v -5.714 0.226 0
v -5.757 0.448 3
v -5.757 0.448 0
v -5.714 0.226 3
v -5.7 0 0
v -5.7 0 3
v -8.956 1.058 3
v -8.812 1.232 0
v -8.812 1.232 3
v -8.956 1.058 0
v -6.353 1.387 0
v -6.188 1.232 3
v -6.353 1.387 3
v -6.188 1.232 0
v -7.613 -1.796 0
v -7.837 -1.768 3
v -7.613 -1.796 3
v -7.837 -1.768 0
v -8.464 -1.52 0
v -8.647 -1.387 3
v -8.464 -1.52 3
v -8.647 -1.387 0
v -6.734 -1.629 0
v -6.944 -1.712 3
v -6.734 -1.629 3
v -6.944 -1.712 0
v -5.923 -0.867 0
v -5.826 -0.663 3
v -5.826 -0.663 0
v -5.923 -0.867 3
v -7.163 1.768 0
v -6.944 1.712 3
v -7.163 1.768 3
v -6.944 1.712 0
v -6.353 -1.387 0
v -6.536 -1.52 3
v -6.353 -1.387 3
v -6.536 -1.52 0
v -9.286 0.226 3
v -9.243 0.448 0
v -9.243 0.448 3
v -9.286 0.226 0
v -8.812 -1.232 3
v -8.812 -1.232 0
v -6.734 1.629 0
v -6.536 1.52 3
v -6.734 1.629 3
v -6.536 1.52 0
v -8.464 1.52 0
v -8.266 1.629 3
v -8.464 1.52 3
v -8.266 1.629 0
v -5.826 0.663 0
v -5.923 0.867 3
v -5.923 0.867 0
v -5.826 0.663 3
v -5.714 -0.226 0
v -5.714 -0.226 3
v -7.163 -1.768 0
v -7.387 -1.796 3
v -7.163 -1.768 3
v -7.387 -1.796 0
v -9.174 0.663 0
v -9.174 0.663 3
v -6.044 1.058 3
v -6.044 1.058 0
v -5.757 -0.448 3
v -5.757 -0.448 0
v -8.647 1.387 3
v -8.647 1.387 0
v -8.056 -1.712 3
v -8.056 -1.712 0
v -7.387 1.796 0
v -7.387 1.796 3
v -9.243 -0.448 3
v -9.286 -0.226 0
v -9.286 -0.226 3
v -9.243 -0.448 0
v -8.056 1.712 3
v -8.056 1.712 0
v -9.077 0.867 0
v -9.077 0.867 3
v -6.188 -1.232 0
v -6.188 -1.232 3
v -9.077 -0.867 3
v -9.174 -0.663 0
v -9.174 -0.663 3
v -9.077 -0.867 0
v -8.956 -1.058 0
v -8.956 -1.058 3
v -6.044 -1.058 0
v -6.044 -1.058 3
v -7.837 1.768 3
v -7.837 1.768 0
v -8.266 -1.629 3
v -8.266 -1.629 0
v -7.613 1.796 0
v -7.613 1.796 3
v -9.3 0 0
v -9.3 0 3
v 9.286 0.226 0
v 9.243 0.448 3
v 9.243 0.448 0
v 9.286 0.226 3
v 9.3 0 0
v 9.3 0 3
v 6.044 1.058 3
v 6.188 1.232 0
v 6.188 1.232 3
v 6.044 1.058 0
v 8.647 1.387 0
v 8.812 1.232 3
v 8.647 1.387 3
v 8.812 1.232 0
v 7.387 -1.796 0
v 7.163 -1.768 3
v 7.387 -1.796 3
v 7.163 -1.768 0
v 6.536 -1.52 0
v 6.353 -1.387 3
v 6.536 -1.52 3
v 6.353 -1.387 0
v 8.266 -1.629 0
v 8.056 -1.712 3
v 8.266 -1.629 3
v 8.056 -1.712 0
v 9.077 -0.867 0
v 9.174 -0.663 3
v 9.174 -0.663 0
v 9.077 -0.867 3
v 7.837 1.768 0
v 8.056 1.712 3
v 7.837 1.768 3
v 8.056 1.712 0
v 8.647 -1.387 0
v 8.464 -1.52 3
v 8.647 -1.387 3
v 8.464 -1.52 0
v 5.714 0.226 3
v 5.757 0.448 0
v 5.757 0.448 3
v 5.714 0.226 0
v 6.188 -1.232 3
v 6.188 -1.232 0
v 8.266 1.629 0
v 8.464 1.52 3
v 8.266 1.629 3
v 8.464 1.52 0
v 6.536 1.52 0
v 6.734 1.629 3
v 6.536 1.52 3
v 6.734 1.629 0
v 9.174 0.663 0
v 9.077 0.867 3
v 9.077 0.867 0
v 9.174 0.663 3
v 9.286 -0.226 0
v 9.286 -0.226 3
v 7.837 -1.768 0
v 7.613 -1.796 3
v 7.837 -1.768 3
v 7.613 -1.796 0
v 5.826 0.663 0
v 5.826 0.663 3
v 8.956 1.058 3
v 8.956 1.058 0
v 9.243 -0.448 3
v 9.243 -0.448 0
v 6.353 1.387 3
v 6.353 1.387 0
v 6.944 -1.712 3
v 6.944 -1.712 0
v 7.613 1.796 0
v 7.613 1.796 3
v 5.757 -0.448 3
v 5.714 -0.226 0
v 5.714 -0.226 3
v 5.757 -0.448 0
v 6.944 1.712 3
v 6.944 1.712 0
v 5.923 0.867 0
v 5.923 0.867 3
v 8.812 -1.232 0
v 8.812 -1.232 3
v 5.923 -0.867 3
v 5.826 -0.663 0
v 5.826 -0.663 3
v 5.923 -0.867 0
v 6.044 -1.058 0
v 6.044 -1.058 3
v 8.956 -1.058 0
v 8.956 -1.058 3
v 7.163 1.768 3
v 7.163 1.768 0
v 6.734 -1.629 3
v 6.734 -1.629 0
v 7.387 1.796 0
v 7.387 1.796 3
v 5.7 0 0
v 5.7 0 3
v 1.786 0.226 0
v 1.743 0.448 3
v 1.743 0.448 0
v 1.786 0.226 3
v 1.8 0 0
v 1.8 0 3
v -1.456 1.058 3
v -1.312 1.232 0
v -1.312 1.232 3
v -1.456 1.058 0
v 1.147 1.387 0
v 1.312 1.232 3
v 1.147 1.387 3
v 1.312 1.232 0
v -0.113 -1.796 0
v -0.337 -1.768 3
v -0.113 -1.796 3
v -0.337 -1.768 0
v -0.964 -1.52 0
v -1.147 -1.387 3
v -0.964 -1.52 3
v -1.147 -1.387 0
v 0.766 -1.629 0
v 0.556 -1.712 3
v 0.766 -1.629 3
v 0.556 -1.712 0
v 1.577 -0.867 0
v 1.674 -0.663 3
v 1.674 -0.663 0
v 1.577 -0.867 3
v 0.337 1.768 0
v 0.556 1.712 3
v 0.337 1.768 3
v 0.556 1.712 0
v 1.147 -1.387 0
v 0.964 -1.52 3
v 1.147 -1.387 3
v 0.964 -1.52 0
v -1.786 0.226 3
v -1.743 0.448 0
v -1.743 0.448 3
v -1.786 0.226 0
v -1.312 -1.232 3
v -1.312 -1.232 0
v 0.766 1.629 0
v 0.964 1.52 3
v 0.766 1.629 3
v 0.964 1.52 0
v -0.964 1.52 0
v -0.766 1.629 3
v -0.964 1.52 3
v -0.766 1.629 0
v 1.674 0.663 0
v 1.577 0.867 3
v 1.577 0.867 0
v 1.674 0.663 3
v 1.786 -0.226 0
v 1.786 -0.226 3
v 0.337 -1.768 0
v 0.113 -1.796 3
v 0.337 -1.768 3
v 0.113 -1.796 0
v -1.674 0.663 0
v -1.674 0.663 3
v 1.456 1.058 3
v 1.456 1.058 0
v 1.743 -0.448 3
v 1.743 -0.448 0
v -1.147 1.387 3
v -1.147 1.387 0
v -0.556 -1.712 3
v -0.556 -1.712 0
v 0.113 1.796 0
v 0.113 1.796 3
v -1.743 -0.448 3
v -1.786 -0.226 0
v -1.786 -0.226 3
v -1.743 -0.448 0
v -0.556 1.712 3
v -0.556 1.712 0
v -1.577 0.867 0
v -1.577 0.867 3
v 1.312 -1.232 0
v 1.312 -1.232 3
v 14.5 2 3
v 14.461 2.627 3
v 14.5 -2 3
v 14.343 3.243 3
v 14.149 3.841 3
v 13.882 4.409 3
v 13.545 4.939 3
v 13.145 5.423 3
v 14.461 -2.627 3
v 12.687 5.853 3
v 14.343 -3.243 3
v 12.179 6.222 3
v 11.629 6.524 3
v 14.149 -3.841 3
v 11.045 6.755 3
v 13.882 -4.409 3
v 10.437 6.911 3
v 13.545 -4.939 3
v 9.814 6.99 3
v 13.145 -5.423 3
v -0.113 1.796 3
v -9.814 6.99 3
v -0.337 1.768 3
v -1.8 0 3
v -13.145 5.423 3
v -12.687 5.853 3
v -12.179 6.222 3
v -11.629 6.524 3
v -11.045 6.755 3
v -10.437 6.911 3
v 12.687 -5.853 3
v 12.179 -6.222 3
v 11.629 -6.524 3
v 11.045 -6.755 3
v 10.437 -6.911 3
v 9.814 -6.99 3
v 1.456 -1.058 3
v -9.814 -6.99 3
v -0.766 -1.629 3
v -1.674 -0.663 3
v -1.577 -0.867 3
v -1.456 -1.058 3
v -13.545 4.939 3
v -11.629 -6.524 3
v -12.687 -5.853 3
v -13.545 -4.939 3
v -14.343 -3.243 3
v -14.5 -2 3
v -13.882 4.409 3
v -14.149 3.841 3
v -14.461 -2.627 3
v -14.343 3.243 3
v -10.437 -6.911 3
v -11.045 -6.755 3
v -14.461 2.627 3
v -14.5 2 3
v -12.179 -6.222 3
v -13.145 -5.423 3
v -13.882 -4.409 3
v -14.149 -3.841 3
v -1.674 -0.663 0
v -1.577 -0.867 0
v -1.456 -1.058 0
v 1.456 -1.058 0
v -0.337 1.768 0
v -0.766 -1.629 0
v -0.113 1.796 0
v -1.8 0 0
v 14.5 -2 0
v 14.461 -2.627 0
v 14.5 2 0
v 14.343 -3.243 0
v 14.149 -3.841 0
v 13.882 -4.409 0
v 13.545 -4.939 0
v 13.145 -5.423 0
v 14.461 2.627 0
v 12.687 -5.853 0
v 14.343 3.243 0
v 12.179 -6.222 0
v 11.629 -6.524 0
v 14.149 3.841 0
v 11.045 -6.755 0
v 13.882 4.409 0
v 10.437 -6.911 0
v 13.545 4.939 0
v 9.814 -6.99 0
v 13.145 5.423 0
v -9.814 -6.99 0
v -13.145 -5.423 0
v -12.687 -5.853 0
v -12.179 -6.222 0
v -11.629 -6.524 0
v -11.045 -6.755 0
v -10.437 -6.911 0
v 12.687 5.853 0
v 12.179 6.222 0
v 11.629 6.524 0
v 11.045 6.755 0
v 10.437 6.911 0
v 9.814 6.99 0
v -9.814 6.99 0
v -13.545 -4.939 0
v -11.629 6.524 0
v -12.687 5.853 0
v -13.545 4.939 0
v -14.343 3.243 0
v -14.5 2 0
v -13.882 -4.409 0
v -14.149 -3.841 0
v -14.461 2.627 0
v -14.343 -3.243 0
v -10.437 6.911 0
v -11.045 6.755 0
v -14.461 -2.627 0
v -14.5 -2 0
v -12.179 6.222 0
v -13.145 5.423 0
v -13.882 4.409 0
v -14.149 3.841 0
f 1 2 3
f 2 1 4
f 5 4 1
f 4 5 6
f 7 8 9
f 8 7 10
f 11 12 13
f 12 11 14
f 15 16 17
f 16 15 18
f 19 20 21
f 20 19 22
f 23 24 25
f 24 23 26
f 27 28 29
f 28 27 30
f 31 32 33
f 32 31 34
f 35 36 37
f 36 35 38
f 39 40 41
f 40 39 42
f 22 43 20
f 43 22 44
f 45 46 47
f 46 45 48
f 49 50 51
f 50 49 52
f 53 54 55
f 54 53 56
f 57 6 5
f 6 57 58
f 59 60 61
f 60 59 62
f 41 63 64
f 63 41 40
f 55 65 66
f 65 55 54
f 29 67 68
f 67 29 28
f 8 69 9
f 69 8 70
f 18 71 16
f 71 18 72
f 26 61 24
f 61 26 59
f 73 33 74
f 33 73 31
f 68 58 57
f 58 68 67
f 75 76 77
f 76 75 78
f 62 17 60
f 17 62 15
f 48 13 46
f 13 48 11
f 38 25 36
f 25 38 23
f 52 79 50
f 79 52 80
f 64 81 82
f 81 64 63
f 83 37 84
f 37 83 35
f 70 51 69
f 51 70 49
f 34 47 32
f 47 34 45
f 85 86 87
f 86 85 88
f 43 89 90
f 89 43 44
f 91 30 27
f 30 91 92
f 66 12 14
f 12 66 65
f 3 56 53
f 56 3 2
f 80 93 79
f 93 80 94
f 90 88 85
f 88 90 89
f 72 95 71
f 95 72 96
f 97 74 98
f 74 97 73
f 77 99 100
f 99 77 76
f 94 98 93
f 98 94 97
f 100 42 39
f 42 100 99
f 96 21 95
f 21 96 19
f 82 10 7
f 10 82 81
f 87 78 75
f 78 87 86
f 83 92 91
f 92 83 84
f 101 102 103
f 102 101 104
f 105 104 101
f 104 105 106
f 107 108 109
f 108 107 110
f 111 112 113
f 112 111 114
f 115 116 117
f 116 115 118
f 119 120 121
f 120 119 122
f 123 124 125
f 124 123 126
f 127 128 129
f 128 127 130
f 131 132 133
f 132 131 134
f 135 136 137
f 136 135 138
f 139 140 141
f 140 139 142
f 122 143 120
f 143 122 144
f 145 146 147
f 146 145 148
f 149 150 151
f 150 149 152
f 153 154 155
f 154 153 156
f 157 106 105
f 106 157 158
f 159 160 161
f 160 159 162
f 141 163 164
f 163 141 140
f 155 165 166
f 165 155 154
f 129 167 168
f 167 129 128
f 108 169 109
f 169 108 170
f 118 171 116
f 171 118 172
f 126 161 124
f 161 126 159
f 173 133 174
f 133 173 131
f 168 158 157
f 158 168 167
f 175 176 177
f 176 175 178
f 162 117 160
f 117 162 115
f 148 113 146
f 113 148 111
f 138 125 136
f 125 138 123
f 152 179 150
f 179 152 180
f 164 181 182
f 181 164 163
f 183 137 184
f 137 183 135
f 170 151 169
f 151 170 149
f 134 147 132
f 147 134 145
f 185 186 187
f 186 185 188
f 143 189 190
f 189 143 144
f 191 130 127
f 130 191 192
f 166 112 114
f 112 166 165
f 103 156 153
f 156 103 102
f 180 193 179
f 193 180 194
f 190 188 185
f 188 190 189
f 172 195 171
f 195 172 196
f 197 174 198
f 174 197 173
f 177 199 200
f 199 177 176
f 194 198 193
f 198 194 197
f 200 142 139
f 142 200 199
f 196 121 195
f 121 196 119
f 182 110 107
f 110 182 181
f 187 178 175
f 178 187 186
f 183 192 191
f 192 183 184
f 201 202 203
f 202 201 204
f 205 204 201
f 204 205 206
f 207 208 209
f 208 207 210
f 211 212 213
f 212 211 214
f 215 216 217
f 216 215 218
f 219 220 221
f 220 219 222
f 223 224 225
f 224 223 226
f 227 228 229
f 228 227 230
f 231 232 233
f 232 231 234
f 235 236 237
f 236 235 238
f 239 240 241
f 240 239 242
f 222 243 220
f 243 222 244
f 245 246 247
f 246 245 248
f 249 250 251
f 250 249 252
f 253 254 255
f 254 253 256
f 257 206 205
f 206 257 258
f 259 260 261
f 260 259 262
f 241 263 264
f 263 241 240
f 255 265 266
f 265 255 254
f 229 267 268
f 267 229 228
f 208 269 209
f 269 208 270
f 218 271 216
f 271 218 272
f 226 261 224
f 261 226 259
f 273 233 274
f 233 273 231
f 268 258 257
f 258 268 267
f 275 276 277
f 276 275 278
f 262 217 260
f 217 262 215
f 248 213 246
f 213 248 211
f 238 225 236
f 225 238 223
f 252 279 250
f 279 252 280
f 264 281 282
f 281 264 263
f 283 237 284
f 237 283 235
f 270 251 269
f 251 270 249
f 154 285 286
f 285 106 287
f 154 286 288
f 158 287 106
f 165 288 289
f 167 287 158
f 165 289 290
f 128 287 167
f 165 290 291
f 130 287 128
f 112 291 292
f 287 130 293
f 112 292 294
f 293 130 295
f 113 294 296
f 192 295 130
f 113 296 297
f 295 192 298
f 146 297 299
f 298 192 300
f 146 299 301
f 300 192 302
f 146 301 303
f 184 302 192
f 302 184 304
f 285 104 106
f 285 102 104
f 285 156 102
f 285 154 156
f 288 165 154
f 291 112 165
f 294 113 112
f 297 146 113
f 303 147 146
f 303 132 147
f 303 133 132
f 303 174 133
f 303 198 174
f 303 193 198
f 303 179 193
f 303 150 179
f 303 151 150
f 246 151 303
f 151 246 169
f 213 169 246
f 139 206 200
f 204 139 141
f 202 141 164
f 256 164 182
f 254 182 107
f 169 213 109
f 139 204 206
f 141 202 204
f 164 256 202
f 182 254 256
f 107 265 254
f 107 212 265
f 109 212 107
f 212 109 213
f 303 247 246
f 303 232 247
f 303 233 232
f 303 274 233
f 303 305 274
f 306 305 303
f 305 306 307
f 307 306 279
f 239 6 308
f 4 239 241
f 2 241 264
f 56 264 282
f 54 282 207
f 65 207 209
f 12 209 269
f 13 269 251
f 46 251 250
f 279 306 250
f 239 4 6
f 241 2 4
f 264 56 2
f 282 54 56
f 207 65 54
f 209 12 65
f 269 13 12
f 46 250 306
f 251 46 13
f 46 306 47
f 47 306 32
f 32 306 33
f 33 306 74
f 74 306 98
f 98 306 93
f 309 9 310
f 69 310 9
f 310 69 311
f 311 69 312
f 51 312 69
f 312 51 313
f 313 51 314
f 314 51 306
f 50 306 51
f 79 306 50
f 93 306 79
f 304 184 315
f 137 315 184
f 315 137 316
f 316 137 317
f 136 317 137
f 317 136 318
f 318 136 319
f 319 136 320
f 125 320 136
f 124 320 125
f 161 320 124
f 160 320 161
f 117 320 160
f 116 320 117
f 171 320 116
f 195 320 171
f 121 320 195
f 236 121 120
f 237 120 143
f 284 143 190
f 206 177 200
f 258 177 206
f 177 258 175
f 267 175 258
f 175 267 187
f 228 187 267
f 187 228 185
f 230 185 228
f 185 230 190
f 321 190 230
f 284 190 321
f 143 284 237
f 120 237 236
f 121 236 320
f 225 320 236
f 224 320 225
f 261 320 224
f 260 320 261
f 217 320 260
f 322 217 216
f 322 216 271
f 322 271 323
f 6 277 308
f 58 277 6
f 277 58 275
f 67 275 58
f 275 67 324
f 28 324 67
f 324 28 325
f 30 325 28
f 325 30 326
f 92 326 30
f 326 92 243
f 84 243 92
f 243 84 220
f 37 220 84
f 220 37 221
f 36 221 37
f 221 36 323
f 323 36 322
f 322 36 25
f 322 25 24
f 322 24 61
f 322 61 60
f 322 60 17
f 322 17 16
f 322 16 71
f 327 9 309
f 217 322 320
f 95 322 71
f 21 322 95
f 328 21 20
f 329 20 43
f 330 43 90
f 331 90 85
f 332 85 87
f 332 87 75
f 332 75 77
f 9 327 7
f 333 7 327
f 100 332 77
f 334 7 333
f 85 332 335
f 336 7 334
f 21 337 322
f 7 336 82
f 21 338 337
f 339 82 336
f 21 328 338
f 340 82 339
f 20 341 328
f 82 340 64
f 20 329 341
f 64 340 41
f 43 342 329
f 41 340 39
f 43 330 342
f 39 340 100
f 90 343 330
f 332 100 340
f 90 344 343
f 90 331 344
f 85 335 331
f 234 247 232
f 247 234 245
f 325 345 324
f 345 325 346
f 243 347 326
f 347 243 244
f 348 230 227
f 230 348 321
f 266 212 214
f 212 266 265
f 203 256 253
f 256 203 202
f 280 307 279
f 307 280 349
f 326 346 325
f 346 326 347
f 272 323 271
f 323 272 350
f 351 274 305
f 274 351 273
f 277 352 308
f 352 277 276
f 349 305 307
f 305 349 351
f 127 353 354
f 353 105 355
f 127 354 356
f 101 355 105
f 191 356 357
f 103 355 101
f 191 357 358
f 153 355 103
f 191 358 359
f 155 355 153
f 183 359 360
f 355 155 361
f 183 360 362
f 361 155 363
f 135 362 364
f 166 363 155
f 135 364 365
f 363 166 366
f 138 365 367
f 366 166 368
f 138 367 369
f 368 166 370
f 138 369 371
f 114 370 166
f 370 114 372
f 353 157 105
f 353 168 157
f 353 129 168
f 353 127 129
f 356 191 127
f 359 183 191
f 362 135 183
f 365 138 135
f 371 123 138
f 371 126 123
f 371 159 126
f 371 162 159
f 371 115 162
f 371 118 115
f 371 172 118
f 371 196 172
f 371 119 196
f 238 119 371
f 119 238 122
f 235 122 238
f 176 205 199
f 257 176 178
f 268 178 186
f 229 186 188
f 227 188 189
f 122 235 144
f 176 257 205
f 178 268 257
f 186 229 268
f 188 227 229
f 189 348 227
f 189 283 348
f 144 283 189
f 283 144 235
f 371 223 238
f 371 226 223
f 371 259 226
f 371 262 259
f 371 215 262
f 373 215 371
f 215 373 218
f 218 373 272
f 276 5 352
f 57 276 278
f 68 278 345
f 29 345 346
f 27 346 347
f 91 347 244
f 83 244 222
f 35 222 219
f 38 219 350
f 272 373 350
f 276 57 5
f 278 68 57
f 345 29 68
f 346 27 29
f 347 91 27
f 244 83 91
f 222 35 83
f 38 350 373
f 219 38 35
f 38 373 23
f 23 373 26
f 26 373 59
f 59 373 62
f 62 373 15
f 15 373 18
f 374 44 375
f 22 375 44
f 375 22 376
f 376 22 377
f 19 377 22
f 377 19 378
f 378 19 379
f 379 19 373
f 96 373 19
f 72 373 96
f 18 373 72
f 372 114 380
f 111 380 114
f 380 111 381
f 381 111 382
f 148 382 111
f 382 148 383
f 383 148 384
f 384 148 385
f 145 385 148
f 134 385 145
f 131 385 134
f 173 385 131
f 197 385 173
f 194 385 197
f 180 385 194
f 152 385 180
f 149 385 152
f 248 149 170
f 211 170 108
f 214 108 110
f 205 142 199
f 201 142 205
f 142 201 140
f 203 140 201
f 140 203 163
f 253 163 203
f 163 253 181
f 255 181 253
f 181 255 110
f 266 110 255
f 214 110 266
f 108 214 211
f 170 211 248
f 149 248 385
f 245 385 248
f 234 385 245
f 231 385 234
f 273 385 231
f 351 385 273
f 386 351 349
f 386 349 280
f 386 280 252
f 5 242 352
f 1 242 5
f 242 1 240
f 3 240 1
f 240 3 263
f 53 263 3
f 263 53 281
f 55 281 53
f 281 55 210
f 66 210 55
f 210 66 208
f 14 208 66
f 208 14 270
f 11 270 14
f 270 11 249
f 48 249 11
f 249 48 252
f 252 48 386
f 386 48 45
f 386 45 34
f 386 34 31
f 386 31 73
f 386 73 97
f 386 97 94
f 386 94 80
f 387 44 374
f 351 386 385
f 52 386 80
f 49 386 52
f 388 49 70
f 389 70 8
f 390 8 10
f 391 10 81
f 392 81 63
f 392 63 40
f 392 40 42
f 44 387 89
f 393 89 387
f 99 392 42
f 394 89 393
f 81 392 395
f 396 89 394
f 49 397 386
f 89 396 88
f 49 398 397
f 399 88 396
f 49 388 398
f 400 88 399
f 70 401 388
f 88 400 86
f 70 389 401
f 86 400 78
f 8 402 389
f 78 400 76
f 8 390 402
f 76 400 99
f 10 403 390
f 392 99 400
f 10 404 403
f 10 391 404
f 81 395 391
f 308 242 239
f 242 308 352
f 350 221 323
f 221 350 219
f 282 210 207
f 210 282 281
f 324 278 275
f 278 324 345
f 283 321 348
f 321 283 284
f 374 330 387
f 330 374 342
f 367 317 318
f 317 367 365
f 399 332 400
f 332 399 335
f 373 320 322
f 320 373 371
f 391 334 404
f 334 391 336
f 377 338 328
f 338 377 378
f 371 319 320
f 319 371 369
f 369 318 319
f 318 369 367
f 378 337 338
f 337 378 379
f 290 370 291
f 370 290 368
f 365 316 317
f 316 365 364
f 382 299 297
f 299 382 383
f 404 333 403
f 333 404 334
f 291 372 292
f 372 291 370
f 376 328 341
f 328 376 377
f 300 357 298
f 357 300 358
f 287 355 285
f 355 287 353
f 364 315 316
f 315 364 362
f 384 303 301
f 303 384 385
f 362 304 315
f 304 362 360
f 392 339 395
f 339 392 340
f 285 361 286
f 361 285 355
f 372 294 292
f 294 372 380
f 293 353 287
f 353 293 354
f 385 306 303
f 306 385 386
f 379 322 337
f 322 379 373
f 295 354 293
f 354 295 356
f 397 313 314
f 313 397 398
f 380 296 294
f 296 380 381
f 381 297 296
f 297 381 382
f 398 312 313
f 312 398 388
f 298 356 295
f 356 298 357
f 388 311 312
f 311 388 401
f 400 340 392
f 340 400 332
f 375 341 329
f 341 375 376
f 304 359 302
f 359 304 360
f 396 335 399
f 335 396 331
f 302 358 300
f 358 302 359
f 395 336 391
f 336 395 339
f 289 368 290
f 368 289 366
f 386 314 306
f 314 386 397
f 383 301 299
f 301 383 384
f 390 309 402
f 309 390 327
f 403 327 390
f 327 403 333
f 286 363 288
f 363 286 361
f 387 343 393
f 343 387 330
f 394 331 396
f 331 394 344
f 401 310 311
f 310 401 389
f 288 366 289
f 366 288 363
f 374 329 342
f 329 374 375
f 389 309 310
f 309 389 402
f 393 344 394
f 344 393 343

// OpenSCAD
$fn = 50;


difference() {
	union() {
		hull() {
			translate(v = [-9.5000000000, 2.0000000000, 0]) {
				cylinder(h = 3, r = 5);
			}
			translate(v = [9.5000000000, 2.0000000000, 0]) {
				cylinder(h = 3, r = 5);
			}
			translate(v = [-9.5000000000, -2.0000000000, 0]) {
				cylinder(h = 3, r = 5);
			}
			translate(v = [9.5000000000, -2.0000000000, 0]) {
				cylinder(h = 3, r = 5);
			}
		}
	}
	union() {
		translate(v = [-7.5000000000, 0.0000000000, -100.0000000000]) {
			cylinder(h = 200, r = 1.8000000000);
		}
		translate(v = [7.5000000000, 0.0000000000, -100.0000000000]) {
			cylinder(h = 200, r = 1.8000000000);
		}
		translate(v = [-7.5000000000, 0.0000000000, 0]) {
			cylinder(h = 3, r = 1.8000000000);
		}
		cylinder(h = 3, r = 1.8000000000);
		translate(v = [7.5000000000, 0.0000000000, 0]) {
			cylinder(h = 3, r = 1.8000000000);
		}
		translate(v = [-7.5000000000, 0.0000000000, 0]) {
			cylinder(h = 3, r = 1.8000000000);
		}
		cylinder(h = 3, r = 1.8000000000);
		translate(v = [7.5000000000, 0.0000000000, 0]) {
			cylinder(h = 3, r = 1.8000000000);
		}
		translate(v = [-7.5000000000, 0.0000000000, 0]) {
			cylinder(h = 3, r = 1.8000000000);
		}
		cylinder(h = 3, r = 1.8000000000);
		translate(v = [7.5000000000, 0.0000000000, 0]) {
			cylinder(h = 3, r = 1.8000000000);
		}
	}
}
